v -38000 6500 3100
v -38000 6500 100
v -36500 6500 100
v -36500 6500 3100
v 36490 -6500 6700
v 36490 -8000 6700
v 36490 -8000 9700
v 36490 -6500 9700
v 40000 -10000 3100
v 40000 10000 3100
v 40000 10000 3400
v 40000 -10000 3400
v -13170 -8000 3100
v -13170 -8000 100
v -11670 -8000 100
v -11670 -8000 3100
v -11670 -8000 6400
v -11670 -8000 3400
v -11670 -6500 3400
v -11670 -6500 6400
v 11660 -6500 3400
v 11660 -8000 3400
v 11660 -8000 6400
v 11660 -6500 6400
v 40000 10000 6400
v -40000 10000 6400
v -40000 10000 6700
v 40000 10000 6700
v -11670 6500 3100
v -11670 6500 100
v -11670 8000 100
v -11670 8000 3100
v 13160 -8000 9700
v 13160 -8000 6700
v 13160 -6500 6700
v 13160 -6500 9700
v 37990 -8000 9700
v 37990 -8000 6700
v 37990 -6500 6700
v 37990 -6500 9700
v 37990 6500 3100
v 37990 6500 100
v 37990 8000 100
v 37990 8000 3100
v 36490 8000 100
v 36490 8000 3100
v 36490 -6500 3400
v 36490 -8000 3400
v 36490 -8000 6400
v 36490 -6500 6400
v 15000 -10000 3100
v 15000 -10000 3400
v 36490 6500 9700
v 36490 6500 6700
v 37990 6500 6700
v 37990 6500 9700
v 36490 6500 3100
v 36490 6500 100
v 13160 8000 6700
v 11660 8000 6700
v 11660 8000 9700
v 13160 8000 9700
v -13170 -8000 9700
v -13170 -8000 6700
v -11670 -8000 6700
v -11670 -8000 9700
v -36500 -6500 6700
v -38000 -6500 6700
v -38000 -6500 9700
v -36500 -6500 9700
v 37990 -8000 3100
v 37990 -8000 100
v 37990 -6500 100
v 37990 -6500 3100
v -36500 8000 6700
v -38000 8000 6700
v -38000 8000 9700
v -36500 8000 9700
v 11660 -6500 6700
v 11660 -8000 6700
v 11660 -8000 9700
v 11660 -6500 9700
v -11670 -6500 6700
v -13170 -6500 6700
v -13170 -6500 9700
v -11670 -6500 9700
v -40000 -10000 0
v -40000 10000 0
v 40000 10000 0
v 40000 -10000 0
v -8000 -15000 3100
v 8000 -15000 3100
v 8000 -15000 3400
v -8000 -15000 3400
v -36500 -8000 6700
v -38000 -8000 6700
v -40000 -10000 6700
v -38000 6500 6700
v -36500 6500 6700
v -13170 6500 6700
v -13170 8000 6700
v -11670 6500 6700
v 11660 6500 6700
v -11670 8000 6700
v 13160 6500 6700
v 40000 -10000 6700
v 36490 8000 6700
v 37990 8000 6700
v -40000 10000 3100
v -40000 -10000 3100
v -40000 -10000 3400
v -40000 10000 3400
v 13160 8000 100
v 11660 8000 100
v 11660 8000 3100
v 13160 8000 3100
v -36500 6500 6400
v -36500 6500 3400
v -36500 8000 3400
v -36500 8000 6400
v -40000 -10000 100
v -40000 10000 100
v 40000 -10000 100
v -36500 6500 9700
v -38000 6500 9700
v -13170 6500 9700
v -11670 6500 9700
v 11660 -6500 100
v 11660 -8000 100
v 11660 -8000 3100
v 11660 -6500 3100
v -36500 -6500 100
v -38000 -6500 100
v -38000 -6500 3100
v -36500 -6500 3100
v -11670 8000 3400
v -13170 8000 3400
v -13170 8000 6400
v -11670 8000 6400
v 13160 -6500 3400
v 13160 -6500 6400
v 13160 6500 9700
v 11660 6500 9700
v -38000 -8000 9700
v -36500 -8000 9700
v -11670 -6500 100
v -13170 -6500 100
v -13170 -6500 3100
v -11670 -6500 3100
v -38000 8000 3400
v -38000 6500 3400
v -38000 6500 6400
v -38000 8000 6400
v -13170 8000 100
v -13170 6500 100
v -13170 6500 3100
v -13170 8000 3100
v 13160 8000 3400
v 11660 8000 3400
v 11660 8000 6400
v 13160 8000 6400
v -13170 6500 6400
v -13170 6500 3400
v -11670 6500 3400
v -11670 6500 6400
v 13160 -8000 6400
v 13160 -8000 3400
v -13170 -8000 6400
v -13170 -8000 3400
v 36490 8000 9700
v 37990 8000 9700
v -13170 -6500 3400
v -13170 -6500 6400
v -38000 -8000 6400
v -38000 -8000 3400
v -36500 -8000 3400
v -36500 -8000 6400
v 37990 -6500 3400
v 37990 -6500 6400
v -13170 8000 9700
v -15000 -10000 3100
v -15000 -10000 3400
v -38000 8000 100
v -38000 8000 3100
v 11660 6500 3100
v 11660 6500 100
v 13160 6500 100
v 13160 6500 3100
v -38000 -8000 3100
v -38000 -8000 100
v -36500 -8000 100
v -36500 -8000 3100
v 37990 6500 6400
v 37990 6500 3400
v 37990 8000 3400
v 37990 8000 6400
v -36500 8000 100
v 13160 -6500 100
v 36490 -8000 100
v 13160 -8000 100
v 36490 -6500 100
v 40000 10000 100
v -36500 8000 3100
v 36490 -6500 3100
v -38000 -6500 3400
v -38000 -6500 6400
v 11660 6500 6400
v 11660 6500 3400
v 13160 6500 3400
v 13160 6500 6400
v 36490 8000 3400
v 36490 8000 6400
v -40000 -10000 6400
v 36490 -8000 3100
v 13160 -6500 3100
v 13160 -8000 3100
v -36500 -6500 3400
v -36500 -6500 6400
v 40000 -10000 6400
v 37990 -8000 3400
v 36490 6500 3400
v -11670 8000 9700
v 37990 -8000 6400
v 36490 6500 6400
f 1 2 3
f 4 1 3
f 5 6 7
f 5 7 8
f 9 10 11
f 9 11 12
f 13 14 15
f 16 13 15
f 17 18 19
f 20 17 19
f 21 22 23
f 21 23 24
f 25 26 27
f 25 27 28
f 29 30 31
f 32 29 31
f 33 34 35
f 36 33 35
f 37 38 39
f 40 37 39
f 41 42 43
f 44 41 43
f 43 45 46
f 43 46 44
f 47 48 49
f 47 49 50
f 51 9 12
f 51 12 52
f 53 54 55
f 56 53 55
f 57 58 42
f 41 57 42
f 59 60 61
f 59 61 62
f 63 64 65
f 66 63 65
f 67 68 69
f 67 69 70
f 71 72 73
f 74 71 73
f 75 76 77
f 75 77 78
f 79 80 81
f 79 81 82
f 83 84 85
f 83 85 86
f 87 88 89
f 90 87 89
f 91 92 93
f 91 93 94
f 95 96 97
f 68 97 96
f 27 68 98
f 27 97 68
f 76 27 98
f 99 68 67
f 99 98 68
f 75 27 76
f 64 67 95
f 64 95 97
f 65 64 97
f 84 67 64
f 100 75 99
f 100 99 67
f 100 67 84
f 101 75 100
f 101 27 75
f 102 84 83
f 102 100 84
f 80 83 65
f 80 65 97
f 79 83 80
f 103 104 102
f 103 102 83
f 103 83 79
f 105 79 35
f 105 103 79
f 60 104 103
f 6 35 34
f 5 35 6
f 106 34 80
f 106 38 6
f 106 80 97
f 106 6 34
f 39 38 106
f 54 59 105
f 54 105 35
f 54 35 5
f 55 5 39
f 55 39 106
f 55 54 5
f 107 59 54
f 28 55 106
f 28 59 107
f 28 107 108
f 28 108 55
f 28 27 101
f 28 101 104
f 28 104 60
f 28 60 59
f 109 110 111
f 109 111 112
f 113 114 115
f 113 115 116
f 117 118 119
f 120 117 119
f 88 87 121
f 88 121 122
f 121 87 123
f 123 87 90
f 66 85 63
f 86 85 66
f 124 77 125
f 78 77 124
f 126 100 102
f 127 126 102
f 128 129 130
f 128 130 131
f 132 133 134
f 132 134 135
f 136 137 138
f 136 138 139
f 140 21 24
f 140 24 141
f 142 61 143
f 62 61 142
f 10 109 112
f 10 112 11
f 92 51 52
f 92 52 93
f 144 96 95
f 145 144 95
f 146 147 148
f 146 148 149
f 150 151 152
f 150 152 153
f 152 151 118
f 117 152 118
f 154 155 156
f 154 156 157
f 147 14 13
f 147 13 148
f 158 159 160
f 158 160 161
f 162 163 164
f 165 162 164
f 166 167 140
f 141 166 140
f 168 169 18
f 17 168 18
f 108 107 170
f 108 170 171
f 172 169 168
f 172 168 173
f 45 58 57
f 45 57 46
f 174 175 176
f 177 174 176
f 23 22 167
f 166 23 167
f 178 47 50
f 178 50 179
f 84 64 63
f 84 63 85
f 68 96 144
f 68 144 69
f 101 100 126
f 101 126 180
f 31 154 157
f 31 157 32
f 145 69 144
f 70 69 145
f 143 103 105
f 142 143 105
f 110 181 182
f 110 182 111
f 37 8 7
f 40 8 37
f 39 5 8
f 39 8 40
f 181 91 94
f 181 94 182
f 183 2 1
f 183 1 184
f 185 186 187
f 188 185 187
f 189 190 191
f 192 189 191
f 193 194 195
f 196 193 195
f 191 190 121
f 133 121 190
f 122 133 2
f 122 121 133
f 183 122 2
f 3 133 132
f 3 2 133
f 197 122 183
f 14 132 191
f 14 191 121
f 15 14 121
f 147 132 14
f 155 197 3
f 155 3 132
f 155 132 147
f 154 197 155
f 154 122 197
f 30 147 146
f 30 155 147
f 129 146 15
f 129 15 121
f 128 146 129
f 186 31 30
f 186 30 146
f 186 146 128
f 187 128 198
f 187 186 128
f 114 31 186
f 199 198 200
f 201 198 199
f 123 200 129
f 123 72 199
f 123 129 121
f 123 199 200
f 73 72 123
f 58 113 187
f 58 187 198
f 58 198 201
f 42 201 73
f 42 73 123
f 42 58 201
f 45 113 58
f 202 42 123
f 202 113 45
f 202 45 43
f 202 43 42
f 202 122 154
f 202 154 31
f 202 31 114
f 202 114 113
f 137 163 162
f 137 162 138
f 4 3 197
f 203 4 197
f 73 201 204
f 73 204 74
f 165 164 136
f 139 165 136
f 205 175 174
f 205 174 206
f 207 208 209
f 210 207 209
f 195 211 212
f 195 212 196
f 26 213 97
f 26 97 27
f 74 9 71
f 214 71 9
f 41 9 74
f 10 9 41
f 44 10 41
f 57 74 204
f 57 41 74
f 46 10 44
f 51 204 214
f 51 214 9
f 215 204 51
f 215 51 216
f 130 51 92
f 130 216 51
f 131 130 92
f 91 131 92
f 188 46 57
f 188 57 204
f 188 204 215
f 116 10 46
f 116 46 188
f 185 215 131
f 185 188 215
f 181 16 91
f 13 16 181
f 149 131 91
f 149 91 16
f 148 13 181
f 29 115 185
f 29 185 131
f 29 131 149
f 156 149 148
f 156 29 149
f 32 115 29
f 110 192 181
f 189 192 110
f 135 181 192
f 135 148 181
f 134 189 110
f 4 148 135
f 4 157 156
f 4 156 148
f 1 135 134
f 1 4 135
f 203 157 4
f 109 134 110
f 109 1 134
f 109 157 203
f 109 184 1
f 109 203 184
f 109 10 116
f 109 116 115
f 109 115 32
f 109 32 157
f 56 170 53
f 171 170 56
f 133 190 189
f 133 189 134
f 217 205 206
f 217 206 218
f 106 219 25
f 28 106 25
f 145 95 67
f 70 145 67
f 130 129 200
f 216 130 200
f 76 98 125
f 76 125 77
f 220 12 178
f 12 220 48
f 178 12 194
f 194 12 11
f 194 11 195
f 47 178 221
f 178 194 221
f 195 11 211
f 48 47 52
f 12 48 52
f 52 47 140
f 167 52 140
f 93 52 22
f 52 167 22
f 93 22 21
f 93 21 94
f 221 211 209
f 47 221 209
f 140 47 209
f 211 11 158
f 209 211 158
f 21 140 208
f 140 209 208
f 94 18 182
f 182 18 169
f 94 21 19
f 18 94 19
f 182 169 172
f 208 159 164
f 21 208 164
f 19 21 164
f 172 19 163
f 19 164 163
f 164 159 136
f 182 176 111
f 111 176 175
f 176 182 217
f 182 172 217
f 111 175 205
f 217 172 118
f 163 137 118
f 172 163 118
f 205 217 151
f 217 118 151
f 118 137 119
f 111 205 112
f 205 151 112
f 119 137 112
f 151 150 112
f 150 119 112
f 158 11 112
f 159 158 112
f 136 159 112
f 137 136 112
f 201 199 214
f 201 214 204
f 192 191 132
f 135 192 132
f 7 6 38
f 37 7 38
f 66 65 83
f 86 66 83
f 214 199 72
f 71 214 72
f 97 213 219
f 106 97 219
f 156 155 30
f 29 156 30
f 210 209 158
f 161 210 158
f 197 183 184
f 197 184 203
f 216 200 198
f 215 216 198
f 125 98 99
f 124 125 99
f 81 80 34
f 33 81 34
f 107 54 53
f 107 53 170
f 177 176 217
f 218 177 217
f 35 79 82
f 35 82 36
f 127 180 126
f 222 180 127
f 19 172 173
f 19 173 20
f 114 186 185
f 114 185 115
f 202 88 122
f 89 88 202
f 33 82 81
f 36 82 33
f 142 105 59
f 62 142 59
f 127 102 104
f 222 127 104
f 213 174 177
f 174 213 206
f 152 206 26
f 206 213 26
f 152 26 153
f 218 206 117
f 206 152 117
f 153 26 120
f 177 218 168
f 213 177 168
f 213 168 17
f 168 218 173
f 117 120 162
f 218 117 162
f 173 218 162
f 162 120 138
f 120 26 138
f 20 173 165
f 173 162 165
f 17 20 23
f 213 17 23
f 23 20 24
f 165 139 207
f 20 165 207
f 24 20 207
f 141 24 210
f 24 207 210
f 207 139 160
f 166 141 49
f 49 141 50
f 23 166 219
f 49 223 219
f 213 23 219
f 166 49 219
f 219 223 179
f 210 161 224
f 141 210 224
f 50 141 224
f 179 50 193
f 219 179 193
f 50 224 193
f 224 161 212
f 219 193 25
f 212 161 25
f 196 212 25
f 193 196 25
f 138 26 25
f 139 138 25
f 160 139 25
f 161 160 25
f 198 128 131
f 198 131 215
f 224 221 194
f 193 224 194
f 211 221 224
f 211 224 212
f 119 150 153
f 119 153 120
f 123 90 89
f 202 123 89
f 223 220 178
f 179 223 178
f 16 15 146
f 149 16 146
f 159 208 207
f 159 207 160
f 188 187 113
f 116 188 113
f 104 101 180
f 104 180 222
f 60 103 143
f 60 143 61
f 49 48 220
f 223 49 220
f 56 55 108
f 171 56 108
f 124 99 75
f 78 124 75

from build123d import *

# Parameters (mm, degrees)
SKETCH1_W                 = 80
SKETCH1_H                 = 20
BOSS_EXTRUDE1_DEPTH       = 0.1
SKETCH3_W                 = 1.5
SKETCH3_H                 = 1.5
BOSS_EXTRUDE2_DEPTH       = 3
BOSS_EXTRUDE3_DEPTH       = 0.3
LPATTERN1_COUNT           = 2
LPATTERN1_PITCH           = 3.3
SKETCH6_W                 = 80
SKETCH6_H                 = 20
BOSS_EXTRUDE4_DEPTH       = 0.3
LPATTERN3_COPY_1_SKETCH_W = 1.5
LPATTERN3_COPY_1_SKETCH_H = 1.5
LPATTERN3_COPY_1_DEPTH    = 3
LPATTERN3_COPY_2_SKETCH_W = 1.5
LPATTERN3_COPY_2_SKETCH_H = 1.5
LPATTERN3_COPY_2_DEPTH    = 3
SCALE1_SCALE              = 1000


with BuildPart() as part:
    # Sketch1 → Boss-Extrude1 (new body)
    with BuildSketch(Plane.XY):
        Rectangle(SKETCH1_W, SKETCH1_H)
    extrude(amount=BOSS_EXTRUDE1_DEPTH)

    # Sketch3 → Boss-Extrude2 (add)
    with BuildSketch(Plane.XY.offset(0.1)):
        with Locations((-37.25, 7.25)):
            Rectangle(SKETCH3_W, SKETCH3_H)
        with Locations((-12.42, 7.25)):
            Rectangle(SKETCH3_W, SKETCH3_H)
        with Locations((12.41, 7.25)):
            Rectangle(SKETCH3_W, SKETCH3_H)
        with Locations((37.24, 7.25)):
            Rectangle(SKETCH3_W, SKETCH3_H)
        with Locations((-12.42, -7.25)):
            Rectangle(SKETCH3_W, SKETCH3_H)
        with Locations((12.41, -7.25)):
            Rectangle(SKETCH3_W, SKETCH3_H)
        with Locations((37.24, -7.25)):
            Rectangle(SKETCH3_W, SKETCH3_H)
        with Locations((-37.25, -7.25)):
            Rectangle(SKETCH3_W, SKETCH3_H)
    boss_extrude2 = extrude(amount=BOSS_EXTRUDE2_DEPTH)

    # Sketch4 → Boss-Extrude3 (add)
    with BuildSketch(Plane.XY.offset(3.1)):
        Polygon((-40, 10), (40, 10), (40, -10), (15, -10), (8, -15), (-8, -15), (-15, -10), (-40, -10), align=None)
    extrude(amount=BOSS_EXTRUDE3_DEPTH)

    # LPattern1: Boss-Extrude2 ×2
    with Locations(*[(0, 0, i * LPATTERN1_PITCH) for i in range(1, LPATTERN1_COUNT)]):
        add(boss_extrude2)

    # Sketch6 → Boss-Extrude4 (add)
    with BuildSketch(Plane.XY.offset(6.4)):
        Rectangle(SKETCH6_W, SKETCH6_H)
    extrude(amount=BOSS_EXTRUDE4_DEPTH)

    # LPattern3 copy 1 sketch → LPattern3 copy 1 (add)
    with BuildSketch(Plane.XY.offset(6.7)):
        with Locations((-37.25, 7.25)):
            Rectangle(LPATTERN3_COPY_1_SKETCH_W, LPATTERN3_COPY_1_SKETCH_H)
        with Locations((-12.42, 7.25)):
            Rectangle(LPATTERN3_COPY_1_SKETCH_W, LPATTERN3_COPY_1_SKETCH_H)
        with Locations((12.41, 7.25)):
            Rectangle(LPATTERN3_COPY_1_SKETCH_W, LPATTERN3_COPY_1_SKETCH_H)
        with Locations((37.24, 7.25)):
            Rectangle(LPATTERN3_COPY_1_SKETCH_W, LPATTERN3_COPY_1_SKETCH_H)
        with Locations((-12.42, -7.25)):
            Rectangle(LPATTERN3_COPY_1_SKETCH_W, LPATTERN3_COPY_1_SKETCH_H)
        with Locations((12.41, -7.25)):
            Rectangle(LPATTERN3_COPY_1_SKETCH_W, LPATTERN3_COPY_1_SKETCH_H)
        with Locations((37.24, -7.25)):
            Rectangle(LPATTERN3_COPY_1_SKETCH_W, LPATTERN3_COPY_1_SKETCH_H)
        with Locations((-37.25, -7.25)):
            Rectangle(LPATTERN3_COPY_1_SKETCH_W, LPATTERN3_COPY_1_SKETCH_H)
    extrude(amount=LPATTERN3_COPY_1_DEPTH)

    # LPattern3 copy 2 sketch → LPattern3 copy 2 (add)
    with BuildSketch(Plane.XY.offset(3.4)):
        with Locations((-37.25, 7.25)):
            Rectangle(LPATTERN3_COPY_2_SKETCH_W, LPATTERN3_COPY_2_SKETCH_H)
        with Locations((-12.42, 7.25)):
            Rectangle(LPATTERN3_COPY_2_SKETCH_W, LPATTERN3_COPY_2_SKETCH_H)
        with Locations((12.41, 7.25)):
            Rectangle(LPATTERN3_COPY_2_SKETCH_W, LPATTERN3_COPY_2_SKETCH_H)
        with Locations((37.24, 7.25)):
            Rectangle(LPATTERN3_COPY_2_SKETCH_W, LPATTERN3_COPY_2_SKETCH_H)
        with Locations((-12.42, -7.25)):
            Rectangle(LPATTERN3_COPY_2_SKETCH_W, LPATTERN3_COPY_2_SKETCH_H)
        with Locations((12.41, -7.25)):
            Rectangle(LPATTERN3_COPY_2_SKETCH_W, LPATTERN3_COPY_2_SKETCH_H)
        with Locations((37.24, -7.25)):
            Rectangle(LPATTERN3_COPY_2_SKETCH_W, LPATTERN3_COPY_2_SKETCH_H)
        with Locations((-37.25, -7.25)):
            Rectangle(LPATTERN3_COPY_2_SKETCH_W, LPATTERN3_COPY_2_SKETCH_H)
    extrude(amount=LPATTERN3_COPY_2_DEPTH)


with BuildPart() as part_1:
    # Scale1: scaled about (0, 0, 0)
    add(part.part.scale(SCALE1_SCALE))


solid = part_1.part
